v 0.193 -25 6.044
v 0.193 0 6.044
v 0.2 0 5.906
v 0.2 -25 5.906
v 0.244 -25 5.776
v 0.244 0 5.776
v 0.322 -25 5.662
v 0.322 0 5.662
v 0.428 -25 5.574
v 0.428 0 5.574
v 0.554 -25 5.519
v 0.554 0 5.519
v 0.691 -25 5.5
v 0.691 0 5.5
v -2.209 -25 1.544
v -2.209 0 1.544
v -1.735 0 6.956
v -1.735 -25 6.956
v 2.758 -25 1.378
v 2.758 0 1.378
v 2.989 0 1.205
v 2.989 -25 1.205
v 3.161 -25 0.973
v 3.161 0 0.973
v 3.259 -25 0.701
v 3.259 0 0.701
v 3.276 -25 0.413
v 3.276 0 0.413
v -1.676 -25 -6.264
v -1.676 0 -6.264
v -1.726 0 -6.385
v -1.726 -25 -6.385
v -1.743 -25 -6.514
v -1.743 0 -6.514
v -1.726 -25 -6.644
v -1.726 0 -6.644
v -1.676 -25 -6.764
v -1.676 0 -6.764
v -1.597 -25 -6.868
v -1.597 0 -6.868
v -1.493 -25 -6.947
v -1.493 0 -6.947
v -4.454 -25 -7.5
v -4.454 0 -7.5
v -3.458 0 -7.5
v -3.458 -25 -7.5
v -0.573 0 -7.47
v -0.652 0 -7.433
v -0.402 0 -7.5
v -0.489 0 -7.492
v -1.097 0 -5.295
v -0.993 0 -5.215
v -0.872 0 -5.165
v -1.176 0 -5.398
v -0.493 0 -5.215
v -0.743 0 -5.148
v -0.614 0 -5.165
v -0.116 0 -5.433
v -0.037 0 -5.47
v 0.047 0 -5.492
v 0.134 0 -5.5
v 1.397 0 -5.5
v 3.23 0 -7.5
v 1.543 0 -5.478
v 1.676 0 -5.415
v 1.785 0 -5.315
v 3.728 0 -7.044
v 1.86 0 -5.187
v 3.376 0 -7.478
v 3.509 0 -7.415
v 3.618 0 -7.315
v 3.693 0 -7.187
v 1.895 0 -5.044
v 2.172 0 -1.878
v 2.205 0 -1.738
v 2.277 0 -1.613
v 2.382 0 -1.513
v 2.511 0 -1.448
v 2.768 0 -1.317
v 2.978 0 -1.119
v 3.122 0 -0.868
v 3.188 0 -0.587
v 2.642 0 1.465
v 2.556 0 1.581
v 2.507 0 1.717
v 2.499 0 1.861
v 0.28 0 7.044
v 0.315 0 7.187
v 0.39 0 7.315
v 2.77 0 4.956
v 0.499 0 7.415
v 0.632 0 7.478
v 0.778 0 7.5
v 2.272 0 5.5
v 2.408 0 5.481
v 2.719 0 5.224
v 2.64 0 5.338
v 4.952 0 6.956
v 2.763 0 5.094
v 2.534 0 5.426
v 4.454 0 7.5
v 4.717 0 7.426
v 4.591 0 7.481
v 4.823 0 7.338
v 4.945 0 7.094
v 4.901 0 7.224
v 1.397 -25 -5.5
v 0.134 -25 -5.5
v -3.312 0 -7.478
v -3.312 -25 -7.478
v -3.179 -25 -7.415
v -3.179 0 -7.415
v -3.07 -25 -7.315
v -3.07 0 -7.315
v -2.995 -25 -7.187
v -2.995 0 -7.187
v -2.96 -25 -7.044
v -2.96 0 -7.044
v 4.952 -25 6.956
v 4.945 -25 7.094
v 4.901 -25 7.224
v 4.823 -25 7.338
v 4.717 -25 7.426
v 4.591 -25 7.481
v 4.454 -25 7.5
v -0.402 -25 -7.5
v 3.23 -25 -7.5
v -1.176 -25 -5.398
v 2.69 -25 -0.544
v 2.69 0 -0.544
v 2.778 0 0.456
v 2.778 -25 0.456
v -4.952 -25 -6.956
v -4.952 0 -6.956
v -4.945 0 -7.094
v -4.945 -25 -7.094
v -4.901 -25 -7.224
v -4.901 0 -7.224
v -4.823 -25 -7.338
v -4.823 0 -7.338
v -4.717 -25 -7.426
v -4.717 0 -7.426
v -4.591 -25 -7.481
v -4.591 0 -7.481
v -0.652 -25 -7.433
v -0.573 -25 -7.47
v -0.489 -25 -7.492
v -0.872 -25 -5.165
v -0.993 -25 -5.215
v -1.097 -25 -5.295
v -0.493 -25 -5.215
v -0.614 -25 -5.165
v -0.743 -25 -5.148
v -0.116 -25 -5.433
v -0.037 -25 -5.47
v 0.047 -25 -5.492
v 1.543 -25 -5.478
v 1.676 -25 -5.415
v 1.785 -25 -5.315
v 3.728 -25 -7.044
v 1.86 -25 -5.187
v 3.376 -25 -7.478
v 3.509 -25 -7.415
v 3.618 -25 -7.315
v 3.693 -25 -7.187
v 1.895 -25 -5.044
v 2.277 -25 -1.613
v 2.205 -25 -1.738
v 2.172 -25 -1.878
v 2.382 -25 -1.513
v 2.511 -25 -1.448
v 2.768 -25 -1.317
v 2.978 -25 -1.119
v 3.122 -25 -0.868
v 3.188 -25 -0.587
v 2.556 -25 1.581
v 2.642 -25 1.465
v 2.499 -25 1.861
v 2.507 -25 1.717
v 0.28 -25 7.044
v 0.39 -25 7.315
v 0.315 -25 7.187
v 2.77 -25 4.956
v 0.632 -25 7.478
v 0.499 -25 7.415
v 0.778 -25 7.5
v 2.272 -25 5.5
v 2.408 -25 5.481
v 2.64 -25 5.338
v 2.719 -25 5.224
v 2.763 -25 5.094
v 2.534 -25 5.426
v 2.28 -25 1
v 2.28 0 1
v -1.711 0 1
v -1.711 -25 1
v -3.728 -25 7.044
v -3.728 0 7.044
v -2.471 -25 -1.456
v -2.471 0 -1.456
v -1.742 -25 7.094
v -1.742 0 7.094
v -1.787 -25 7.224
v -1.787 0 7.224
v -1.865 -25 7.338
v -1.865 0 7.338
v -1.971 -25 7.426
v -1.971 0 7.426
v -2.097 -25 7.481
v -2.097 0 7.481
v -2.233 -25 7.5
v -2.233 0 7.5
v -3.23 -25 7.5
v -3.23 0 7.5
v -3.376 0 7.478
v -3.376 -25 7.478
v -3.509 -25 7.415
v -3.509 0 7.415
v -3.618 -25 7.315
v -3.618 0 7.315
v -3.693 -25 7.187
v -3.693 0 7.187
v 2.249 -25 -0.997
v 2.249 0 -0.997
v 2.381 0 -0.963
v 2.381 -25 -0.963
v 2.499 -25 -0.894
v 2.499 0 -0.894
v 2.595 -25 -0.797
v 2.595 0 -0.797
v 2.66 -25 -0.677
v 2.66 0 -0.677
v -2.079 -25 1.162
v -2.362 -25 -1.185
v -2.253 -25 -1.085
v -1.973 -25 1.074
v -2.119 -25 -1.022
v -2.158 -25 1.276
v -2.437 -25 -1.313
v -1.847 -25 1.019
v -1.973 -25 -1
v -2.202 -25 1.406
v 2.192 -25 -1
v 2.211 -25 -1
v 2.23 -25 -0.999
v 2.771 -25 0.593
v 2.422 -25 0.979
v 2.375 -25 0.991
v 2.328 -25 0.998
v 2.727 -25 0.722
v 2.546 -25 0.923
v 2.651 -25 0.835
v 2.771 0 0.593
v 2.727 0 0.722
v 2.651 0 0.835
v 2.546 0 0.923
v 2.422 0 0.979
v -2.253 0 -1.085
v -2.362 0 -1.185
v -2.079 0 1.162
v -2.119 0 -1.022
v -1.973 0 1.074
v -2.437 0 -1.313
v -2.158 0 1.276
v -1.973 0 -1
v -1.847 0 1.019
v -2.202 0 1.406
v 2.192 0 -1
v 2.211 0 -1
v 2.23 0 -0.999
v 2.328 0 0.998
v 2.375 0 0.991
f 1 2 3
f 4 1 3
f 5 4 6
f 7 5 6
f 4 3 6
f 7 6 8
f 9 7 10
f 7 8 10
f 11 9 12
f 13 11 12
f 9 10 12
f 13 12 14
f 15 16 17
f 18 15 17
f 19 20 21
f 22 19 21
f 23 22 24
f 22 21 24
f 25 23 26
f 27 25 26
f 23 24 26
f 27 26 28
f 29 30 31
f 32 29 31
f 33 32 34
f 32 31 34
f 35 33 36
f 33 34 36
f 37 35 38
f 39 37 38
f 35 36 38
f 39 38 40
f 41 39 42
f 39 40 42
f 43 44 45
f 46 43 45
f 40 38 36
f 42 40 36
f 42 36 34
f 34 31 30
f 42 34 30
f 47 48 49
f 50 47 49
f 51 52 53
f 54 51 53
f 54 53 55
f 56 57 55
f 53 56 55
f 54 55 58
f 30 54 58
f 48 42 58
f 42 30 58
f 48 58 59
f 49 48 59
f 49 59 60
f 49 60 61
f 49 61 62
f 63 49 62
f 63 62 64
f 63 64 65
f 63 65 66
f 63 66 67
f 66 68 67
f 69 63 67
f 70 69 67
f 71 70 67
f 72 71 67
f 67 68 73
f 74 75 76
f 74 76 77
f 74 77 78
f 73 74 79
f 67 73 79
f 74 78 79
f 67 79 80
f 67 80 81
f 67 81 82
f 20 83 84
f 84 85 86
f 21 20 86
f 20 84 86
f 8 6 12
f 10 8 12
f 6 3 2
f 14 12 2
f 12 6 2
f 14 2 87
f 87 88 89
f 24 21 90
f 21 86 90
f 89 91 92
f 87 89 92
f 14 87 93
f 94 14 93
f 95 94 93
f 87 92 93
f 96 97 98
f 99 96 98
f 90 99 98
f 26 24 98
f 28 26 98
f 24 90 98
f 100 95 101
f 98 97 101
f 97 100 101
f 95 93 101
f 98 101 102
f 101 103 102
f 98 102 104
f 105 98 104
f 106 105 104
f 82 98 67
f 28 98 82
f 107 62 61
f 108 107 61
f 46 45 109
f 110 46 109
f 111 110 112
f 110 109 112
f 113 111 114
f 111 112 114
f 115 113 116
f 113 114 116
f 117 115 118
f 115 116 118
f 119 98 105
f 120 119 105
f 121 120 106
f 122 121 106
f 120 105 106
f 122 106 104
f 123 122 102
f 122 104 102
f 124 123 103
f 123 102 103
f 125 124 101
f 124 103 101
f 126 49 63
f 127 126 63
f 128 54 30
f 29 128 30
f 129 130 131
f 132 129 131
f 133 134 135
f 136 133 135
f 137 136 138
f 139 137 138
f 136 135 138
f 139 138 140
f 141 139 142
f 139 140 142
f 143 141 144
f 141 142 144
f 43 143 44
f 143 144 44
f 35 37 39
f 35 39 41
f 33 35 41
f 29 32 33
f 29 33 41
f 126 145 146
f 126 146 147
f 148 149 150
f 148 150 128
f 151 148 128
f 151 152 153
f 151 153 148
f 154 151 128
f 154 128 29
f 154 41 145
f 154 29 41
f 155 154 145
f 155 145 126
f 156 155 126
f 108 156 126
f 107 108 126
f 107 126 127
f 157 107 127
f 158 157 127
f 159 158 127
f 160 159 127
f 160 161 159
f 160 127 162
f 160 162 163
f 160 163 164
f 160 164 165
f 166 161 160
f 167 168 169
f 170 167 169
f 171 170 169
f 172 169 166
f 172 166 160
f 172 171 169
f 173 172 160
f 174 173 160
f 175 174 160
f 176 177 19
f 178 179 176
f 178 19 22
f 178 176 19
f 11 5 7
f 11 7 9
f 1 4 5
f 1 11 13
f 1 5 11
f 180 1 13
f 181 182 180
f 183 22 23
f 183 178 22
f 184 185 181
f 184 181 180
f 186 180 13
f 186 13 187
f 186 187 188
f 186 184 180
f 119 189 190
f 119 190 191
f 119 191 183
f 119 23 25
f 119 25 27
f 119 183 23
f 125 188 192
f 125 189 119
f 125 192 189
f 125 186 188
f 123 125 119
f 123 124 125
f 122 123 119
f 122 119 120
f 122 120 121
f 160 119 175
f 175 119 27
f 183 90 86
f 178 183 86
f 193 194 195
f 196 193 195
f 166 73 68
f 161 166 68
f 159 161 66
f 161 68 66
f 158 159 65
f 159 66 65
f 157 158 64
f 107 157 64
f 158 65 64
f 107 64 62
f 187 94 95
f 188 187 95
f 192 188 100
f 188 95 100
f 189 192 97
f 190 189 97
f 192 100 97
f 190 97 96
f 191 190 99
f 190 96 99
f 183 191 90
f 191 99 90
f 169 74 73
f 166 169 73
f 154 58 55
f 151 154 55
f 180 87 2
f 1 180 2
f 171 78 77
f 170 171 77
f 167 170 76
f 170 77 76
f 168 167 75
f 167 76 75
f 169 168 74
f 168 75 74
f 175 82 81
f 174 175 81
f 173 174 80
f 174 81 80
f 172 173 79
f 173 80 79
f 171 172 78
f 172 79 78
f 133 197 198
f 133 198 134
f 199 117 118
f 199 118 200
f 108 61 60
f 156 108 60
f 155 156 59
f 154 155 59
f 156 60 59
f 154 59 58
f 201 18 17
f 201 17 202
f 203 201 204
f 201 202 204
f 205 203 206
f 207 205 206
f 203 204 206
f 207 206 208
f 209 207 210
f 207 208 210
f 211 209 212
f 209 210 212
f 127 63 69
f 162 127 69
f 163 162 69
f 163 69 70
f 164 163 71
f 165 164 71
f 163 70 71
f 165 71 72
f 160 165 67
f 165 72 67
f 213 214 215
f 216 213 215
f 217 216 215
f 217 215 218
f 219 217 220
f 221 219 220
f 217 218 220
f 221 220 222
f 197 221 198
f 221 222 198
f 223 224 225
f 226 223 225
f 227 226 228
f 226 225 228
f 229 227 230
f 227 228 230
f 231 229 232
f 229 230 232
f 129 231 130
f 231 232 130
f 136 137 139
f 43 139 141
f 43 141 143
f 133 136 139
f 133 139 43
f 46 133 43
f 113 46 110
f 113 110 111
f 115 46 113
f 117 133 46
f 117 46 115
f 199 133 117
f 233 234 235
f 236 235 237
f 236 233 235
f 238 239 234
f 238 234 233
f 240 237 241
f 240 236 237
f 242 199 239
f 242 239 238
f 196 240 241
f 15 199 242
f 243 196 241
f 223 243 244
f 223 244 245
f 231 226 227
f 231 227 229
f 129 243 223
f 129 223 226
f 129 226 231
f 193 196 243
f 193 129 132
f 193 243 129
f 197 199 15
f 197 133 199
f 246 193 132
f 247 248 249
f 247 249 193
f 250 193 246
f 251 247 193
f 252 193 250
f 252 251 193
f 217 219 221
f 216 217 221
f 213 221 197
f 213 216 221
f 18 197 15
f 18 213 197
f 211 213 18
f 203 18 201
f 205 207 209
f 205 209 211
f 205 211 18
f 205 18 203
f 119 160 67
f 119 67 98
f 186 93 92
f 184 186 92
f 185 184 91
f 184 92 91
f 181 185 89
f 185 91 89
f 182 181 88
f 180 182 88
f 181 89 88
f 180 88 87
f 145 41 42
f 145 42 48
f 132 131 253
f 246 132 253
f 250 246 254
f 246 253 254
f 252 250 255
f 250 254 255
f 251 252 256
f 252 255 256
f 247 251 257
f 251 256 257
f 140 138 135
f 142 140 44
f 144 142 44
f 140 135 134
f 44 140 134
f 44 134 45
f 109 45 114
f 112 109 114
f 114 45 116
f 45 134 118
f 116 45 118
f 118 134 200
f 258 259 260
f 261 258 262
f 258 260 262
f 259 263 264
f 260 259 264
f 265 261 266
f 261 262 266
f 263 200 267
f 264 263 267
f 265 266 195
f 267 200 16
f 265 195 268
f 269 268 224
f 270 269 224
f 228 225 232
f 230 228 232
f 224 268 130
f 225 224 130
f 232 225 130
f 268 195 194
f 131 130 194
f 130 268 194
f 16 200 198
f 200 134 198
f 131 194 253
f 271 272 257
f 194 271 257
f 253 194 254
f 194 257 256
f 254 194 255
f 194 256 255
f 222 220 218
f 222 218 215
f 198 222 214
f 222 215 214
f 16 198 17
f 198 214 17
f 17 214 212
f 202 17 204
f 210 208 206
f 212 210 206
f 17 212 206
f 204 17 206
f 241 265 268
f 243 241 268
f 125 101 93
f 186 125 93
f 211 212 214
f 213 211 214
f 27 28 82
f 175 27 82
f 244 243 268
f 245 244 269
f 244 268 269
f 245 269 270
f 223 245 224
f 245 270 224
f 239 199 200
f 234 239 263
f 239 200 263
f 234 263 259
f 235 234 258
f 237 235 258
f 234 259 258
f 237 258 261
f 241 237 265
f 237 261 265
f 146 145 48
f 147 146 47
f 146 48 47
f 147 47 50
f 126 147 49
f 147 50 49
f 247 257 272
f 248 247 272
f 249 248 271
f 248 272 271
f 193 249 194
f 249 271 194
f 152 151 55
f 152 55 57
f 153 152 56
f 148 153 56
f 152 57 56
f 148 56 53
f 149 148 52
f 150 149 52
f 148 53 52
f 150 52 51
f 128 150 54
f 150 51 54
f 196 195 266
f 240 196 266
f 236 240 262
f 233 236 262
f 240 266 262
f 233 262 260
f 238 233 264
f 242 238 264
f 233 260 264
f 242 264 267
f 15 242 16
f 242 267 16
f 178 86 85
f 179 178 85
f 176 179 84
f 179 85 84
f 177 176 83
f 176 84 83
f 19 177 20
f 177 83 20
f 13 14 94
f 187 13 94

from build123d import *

# Parameters (mm, degrees)
F1_DEPTH = 25


with BuildPart() as f1:
    # F0 (on Front) → F1 (new body)
    with BuildSketch(Plane.XZ):
        with BuildLine():
            Line((-3.727602, 7.043578), (-4.952443, -6.956422))
            ThreePointArc((-4.952443, -6.956422), (-4.822984, -7.337795), (-4.454346, -7.5))
            Line((-4.454346, -7.5), (-3.458166, -7.5))
            ThreePointArc((-3.458166, -7.5), (-3.12037, -7.368639), (-2.960068, -7.043578))
            Line((-2.960068, -7.043578), (-2.471255, -1.456422))
            ThreePointArc((-2.471255, -1.456422), (-2.310953, -1.131361), (-1.973158, -1))
            Line((-1.973158, -1), (2.192069, -1))
            ThreePointArc((2.192069, -1), (2.220576, -0.999187), (2.248991, -0.996749))
            Line((2.248991, -0.996749), (2.421875, 0.979318))
            ThreePointArc((2.421875, 0.979318), (2.351464, 0.994803), (2.279558, 1))
            Line((2.279558, 1), (-1.710692, 1))
            ThreePointArc((-1.710692, 1), (-2.079331, 1.162205), (-2.208789, 1.543578))
            Line((-2.208789, 1.543578), (-1.735227, 6.956422))
            ThreePointArc((-1.735227, 6.956422), (-1.864686, 7.337795), (-2.233324, 7.5))
            Line((-2.233324, 7.5), (-3.229504, 7.5))
            ThreePointArc((-3.229504, 7.5), (-3.5673, 7.368639), (-3.727602, 7.043578))
        make_face()
        with BuildLine():
            Line((2.421875, 0.979318), (2.248991, -0.996749))
            ThreePointArc((2.248991, -0.996749), (2.550333, -0.84878), (2.690166, -0.543578))
            Line((2.690166, -0.543578), (2.777655, 0.456422))
            ThreePointArc((2.777655, 0.456422), (2.692943, 0.781269), (2.421875, 0.979318))
        make_face()
        with BuildLine():
            Line((4.454346, 7.5), (0.778135, 7.5))
            ThreePointArc((0.778135, 7.5), (0.44034, 7.368639), (0.280038, 7.043578))
            Line((0.280038, 7.043578), (0.192549, 6.043578))
            ThreePointArc((0.192549, 6.043578), (0.322008, 5.662205), (0.690647, 5.5))
            Line((0.690647, 5.5), (2.271729, 5.5))
            ThreePointArc((2.271729, 5.5), (2.640367, 5.337795), (2.769826, 4.956422))
            Line((2.769826, 4.956422), (2.498997, 1.860826))
            ThreePointArc((2.498997, 1.860826), (2.556487, 1.580889), (2.757915, 1.378165))
            ThreePointArc((2.757915, 1.378165), (3.160771, 0.972719), (3.275752, 0.412844))
            Line((3.275752, 0.412844), (3.188264, -0.587156))
            ThreePointArc((3.188264, -0.587156), (2.977808, -1.118558), (2.510667, -1.44789))
            ThreePointArc((2.510667, -1.44789), (2.277097, -1.612556), (2.171869, -1.878257))
            Line((2.171869, -1.878257), (1.894939, -5.043578))
            ThreePointArc((1.894939, -5.043578), (1.734637, -5.368639), (1.396842, -5.5))
            Line((1.396842, -5.5), (0.133975, -5.5))
            ThreePointArc((0.133975, -5.5), (0.004565, -5.482963), (-0.116025, -5.433013))
            Line((-0.116025, -5.433013), (-0.492953, -5.215393))
            ThreePointArc((-0.492953, -5.215393), (-0.872362, -5.165443), (-1.175966, -5.398406))
            Line((-1.175966, -5.398406), (-1.675966, -6.264432))
            ThreePointArc((-1.675966, -6.264432), (-1.725916, -6.643841), (-1.492953, -6.947444))
            Line((-1.492953, -6.947444), (-0.651924, -7.433013))
            ThreePointArc((-0.651924, -7.433013), (-0.531333, -7.482963), (-0.401924, -7.5))
            Line((-0.401924, -7.5), (3.229504, -7.5))
            ThreePointArc((3.229504, -7.5), (3.5673, -7.368639), (3.727602, -7.043578))
            Line((3.727602, -7.043578), (4.952443, 6.956422))
            ThreePointArc((4.952443, 6.956422), (4.822984, 7.337795), (4.454346, 7.5))
        make_face()
    extrude(amount=F1_DEPTH)


solid = f1.part
